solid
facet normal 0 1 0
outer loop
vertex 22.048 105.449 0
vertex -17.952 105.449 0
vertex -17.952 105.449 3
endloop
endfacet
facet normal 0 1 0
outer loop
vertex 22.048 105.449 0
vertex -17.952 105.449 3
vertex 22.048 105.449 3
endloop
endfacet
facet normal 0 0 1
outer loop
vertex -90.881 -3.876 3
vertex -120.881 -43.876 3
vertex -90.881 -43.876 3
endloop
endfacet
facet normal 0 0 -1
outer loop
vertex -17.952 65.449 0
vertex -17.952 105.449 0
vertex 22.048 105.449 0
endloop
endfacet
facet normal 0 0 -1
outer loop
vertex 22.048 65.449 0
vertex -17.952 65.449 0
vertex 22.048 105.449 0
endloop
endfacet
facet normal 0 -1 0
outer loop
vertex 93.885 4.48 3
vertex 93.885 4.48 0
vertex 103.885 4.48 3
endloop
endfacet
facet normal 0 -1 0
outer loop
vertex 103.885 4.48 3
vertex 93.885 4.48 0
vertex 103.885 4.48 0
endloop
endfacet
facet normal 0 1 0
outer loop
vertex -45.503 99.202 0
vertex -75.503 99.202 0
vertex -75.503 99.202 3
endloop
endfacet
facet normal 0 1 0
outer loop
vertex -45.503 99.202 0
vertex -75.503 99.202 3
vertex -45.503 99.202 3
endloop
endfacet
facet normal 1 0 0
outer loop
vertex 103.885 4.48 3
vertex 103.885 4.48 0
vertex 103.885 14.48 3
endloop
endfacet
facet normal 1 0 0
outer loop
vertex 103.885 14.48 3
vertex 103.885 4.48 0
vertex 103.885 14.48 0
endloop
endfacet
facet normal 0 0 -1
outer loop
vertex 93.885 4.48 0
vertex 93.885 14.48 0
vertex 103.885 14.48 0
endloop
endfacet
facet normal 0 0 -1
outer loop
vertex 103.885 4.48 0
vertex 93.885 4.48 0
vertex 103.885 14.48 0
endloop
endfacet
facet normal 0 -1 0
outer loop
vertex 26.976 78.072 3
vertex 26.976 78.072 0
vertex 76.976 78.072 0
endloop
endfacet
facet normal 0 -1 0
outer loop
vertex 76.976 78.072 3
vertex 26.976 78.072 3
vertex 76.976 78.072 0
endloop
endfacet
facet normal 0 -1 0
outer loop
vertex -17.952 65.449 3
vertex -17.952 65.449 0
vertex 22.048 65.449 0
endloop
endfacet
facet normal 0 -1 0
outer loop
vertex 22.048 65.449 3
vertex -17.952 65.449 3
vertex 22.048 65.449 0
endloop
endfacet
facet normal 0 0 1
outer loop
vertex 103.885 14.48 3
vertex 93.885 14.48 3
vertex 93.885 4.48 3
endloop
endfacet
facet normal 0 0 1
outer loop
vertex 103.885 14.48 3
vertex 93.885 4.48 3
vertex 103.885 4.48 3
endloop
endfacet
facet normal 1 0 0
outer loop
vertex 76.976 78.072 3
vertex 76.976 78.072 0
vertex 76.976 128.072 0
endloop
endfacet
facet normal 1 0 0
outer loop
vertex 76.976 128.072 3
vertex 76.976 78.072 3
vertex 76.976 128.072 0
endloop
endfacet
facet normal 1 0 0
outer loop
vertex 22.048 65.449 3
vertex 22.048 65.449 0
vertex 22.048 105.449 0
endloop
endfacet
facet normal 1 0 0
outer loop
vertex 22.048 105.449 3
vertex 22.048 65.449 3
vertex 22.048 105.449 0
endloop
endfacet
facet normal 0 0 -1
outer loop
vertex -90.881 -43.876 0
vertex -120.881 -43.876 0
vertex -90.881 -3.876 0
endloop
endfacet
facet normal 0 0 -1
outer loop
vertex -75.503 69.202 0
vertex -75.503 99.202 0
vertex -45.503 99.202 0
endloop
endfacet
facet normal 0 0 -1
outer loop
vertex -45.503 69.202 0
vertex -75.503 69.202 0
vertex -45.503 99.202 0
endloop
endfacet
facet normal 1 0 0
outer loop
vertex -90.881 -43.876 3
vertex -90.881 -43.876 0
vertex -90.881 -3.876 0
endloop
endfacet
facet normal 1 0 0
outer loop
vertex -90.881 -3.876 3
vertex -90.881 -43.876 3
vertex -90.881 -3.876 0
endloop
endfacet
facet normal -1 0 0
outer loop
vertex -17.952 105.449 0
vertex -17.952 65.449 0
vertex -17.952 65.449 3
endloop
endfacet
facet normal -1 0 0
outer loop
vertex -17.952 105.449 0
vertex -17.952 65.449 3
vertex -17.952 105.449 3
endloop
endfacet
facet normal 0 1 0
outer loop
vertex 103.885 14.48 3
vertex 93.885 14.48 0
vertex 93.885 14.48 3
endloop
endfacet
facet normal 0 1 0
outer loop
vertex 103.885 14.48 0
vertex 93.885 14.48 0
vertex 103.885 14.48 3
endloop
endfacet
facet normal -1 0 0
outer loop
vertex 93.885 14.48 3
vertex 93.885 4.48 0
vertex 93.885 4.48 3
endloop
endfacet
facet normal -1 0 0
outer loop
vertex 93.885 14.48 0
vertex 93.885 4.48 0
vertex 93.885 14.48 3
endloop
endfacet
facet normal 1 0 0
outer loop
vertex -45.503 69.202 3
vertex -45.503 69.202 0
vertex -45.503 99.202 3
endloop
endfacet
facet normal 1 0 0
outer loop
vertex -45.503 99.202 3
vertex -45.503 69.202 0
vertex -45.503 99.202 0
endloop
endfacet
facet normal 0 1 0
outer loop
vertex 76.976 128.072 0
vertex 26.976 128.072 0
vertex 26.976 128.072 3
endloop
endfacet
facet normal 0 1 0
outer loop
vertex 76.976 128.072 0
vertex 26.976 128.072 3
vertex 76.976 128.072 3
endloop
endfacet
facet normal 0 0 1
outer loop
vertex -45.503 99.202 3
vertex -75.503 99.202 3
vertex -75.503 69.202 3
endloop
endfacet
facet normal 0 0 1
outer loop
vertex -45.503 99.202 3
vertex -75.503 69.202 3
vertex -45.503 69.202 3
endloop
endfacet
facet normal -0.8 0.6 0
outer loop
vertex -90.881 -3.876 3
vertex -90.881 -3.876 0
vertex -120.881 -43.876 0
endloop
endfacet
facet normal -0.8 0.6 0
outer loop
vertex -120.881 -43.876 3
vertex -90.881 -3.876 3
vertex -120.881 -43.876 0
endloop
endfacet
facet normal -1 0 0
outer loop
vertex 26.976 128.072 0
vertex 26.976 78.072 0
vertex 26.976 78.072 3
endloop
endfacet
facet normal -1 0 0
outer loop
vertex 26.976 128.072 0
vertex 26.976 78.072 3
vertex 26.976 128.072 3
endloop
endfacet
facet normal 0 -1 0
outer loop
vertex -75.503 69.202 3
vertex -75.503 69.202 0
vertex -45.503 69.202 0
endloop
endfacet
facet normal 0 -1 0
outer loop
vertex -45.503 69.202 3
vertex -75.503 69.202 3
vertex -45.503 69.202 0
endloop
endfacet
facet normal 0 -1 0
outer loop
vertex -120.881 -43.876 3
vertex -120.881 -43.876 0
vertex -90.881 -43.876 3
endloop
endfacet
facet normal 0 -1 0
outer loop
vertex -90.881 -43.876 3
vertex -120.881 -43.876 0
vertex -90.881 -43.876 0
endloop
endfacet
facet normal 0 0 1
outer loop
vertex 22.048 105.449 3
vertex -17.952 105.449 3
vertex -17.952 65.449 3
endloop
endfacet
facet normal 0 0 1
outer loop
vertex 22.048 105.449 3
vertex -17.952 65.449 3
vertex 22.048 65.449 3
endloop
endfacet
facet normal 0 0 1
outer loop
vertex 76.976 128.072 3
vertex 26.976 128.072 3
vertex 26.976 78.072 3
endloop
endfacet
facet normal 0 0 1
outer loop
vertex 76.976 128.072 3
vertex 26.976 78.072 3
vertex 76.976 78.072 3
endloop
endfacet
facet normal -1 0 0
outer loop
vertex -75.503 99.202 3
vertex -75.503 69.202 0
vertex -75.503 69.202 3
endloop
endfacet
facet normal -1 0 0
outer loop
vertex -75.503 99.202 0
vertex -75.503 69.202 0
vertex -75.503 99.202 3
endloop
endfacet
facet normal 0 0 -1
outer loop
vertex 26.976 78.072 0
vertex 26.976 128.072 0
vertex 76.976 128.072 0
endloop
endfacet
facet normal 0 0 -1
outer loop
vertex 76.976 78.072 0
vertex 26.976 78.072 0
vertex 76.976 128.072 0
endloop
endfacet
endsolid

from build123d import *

# Parameters (mm, degrees)
F0_W     = 30
F0_H     = 30
F0_W_2   = 40
F0_H_2   = 40
F0_W_3   = 50
F0_H_3   = 50
F0_W_4   = 10
F0_H_4   = 10
F1_DEPTH = 3


with BuildPart() as f1:
    # F0 (on Top) → F1 (new body)
    with BuildSketch(Plane.XY):
        Polygon((-90.880709, -3.876465), (-120.880709, -43.876465), (-90.880709, -43.876465), align=None)
        with Locations((-60.5028, 84.20198)):
            Rectangle(F0_W, F0_H)
        with Locations((2.048062, 85.44915)):
            Rectangle(F0_W_2, F0_H_2)
        with Locations((51.975785, 103.072295)):
            Rectangle(F0_W_3, F0_H_3)
        with Locations((98.884682, 9.480448)):
            Rectangle(F0_W_4, F0_H_4)
    extrude(amount=F1_DEPTH)


solid = f1.part
